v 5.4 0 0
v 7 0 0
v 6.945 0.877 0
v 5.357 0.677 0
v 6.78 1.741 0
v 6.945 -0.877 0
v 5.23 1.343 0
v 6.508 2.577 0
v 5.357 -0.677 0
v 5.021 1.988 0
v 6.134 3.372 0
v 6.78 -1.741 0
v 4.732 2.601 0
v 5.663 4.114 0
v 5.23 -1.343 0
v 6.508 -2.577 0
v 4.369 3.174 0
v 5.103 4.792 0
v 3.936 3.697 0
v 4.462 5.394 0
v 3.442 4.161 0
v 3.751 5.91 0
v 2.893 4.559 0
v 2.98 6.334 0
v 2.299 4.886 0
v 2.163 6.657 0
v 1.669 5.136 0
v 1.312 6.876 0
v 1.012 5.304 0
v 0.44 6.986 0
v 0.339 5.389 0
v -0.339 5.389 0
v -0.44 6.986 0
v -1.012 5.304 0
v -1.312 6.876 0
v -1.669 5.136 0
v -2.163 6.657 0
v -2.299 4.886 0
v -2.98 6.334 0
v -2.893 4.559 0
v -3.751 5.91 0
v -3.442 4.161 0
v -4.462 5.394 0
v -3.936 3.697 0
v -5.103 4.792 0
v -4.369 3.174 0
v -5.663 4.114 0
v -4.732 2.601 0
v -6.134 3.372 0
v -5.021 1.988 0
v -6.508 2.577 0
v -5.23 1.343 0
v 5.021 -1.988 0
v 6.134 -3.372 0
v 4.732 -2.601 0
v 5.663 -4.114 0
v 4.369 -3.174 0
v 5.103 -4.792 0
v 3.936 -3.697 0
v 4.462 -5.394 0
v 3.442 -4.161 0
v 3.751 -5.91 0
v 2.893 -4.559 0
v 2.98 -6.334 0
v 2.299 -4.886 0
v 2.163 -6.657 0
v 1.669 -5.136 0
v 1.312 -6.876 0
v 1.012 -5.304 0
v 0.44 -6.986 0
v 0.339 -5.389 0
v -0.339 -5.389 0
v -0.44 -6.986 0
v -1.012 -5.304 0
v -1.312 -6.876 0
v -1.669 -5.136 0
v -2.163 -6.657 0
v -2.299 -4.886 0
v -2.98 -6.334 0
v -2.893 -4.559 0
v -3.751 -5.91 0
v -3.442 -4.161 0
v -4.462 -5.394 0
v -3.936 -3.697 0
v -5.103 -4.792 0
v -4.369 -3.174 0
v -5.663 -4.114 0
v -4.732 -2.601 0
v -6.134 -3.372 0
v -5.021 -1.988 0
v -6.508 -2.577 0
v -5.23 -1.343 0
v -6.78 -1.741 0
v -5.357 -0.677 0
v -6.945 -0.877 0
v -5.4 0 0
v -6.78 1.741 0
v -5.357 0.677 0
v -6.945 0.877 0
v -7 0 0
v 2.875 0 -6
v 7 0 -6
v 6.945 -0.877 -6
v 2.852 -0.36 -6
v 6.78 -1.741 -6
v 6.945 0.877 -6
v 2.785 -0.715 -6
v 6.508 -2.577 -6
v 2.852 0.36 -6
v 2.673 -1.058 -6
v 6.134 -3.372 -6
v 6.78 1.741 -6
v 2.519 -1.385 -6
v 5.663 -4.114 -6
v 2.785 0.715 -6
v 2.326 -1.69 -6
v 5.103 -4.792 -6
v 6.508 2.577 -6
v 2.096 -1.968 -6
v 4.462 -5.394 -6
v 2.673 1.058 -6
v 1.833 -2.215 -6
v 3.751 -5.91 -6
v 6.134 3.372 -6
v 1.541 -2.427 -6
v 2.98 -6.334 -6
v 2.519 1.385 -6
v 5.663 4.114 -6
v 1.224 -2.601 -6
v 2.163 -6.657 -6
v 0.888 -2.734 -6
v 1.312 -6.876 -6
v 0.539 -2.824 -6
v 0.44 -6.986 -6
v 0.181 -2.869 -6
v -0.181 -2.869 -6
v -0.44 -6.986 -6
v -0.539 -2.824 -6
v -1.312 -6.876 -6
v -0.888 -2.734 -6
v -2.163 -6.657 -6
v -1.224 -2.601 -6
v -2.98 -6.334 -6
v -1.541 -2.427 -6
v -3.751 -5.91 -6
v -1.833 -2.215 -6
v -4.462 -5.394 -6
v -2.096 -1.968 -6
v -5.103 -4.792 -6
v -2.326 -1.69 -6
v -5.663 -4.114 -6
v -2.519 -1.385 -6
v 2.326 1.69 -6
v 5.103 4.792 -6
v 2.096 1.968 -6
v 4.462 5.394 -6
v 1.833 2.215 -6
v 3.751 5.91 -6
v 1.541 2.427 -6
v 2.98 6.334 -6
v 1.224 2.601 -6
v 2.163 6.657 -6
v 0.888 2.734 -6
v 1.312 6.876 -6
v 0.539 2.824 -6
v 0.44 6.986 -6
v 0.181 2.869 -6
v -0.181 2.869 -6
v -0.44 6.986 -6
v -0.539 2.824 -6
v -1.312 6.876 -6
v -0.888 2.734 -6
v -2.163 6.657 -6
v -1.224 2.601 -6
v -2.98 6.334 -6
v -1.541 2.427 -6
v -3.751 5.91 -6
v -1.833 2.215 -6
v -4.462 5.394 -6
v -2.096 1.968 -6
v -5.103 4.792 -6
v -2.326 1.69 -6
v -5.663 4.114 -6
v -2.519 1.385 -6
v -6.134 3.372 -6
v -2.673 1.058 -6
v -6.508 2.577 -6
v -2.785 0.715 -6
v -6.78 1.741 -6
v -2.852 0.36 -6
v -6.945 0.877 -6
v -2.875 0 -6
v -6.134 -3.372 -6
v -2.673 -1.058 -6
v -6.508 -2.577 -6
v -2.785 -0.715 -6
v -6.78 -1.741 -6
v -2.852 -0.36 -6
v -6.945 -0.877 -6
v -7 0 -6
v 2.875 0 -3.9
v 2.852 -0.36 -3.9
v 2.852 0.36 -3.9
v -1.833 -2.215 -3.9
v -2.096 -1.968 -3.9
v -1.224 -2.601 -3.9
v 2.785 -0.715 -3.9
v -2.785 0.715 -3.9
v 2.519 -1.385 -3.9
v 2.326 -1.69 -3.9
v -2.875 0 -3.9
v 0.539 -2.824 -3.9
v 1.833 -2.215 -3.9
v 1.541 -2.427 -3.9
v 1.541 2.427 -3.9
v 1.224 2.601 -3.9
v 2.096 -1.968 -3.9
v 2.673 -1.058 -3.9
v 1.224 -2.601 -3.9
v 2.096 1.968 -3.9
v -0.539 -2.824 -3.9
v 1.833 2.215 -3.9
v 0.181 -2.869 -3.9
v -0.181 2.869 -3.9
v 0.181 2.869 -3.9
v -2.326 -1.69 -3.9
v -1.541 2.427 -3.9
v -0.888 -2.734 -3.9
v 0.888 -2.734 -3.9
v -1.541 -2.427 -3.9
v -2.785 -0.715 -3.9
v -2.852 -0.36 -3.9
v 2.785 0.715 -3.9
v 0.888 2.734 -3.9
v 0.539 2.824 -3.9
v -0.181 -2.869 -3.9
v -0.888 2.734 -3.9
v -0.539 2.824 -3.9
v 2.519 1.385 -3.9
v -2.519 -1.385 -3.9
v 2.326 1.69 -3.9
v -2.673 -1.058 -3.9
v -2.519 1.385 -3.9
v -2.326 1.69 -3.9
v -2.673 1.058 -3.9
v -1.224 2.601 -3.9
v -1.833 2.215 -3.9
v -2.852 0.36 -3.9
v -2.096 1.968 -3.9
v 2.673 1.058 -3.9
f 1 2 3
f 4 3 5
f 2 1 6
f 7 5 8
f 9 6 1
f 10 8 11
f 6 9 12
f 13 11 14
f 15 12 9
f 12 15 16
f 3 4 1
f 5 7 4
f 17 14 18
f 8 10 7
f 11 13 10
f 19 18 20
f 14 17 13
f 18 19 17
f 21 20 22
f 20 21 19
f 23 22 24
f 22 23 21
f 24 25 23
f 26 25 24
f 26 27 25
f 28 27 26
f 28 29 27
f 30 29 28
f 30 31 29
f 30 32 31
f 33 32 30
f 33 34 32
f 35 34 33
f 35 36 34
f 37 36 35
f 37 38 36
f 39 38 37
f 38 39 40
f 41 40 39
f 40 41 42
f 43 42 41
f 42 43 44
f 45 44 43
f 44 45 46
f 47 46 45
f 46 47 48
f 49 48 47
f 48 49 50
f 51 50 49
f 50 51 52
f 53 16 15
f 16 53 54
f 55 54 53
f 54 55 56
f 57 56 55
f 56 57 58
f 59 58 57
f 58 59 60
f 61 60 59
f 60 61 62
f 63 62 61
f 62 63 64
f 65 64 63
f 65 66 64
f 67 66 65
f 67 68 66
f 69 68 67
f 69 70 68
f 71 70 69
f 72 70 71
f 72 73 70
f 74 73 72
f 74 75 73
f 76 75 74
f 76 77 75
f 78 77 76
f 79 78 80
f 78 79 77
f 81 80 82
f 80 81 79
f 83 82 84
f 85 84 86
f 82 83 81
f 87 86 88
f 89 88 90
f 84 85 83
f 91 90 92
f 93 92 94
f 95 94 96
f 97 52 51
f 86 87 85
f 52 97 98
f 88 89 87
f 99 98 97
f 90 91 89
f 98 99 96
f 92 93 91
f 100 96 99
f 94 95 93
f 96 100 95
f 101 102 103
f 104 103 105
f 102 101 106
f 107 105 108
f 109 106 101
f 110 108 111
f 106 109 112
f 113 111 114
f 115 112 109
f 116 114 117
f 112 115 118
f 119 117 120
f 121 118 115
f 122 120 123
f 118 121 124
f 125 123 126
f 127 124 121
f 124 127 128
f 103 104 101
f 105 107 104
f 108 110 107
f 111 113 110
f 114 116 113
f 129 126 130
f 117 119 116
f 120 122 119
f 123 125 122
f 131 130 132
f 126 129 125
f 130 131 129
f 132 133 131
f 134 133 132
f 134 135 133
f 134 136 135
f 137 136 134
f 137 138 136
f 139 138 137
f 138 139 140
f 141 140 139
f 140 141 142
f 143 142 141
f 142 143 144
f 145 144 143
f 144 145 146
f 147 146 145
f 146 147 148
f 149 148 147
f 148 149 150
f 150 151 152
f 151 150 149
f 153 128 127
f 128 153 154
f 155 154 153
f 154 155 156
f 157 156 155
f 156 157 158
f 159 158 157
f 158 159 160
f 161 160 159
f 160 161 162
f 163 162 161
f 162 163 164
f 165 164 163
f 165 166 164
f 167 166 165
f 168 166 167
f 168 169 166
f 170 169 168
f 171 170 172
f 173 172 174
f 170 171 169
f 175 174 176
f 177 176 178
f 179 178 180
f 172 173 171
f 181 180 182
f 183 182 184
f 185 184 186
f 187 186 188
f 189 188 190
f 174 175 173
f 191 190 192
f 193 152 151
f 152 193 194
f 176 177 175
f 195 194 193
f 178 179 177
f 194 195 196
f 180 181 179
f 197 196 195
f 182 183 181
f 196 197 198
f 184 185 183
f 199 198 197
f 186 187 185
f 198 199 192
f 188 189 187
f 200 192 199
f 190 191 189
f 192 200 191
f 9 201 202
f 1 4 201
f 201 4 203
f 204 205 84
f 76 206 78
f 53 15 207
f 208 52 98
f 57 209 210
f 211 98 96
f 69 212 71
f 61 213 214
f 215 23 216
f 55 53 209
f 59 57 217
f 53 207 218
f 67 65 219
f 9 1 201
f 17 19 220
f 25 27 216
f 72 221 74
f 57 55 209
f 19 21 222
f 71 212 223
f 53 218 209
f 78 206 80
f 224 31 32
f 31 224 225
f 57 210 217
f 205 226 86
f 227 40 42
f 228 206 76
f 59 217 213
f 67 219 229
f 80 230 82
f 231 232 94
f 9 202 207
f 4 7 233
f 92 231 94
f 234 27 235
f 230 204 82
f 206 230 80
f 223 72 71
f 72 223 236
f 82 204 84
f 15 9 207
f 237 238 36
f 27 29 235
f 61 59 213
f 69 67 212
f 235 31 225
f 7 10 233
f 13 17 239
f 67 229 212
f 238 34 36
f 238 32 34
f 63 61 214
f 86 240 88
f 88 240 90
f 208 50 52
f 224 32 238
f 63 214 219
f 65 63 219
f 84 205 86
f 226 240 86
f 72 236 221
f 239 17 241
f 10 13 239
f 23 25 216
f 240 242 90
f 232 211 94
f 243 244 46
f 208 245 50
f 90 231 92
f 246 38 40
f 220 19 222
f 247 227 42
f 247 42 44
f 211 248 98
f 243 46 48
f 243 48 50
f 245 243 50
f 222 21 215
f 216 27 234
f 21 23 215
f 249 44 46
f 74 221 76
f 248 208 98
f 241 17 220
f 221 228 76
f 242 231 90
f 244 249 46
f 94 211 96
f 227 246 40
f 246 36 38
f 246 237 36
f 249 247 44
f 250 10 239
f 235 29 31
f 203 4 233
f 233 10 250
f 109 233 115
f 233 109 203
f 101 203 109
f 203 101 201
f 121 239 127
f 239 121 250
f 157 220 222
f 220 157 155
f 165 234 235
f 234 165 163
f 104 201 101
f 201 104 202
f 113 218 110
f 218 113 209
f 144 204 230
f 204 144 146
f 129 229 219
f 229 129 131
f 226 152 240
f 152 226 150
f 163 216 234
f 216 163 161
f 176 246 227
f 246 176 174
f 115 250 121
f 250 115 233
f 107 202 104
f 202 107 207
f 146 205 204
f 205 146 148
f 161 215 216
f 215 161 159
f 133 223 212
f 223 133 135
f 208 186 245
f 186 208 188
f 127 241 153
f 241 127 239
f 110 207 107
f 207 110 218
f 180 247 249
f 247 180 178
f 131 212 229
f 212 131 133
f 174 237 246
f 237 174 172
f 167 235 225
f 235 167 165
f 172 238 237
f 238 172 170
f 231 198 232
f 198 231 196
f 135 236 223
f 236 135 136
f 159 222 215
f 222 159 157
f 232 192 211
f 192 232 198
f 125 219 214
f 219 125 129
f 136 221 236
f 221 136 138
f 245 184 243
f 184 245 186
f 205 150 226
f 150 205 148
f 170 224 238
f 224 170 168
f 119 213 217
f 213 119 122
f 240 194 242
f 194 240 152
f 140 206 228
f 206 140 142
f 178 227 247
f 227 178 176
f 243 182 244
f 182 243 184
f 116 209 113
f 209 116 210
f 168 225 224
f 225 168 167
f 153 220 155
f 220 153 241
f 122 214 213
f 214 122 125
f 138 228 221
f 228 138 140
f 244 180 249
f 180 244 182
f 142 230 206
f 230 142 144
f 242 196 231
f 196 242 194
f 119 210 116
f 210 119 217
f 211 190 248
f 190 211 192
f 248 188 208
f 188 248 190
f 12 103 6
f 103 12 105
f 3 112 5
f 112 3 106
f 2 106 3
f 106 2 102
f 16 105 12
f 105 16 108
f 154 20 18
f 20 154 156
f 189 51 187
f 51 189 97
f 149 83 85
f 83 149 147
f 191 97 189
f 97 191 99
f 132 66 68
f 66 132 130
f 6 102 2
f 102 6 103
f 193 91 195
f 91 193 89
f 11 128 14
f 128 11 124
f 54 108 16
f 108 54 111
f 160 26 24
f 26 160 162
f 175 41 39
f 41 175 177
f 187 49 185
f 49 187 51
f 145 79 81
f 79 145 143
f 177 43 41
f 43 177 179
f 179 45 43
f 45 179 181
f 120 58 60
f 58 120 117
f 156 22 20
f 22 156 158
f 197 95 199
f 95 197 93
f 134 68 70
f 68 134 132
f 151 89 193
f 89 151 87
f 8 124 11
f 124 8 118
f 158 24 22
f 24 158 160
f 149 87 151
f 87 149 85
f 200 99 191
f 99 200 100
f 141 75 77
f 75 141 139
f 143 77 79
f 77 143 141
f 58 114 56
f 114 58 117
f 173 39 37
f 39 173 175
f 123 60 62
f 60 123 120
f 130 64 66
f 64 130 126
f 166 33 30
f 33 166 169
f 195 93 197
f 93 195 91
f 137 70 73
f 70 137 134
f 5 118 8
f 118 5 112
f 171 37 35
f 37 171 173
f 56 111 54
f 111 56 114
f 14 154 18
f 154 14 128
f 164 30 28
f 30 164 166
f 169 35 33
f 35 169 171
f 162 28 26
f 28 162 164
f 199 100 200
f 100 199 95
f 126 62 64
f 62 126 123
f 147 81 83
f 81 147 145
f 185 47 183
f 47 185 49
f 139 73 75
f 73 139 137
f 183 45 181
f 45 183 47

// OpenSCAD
$fn = 50;


difference() {
	union() {
		translate(v = [0, 0, -6.0000000000]) {
			cylinder(h = 6, r = 7.0000000000);
		}
	}
	union() {
		translate(v = [0, 0, 0]) {
			rotate(a = [0, 0, 0]) {
				difference() {
					union() {
						#translate(v = [0, 0, -6.0000000000]) {
							cylinder(h = 6, r = 2.6000000000);
						}
						#translate(v = [0, 0, -3.9000000000]) {
							cylinder(h = 3.9000000000, r = 7.0000000000, r1 = 2.8750000000, r2 = 5.4000000000);
						}
						#translate(v = [0, 0, -6.0000000000]) {
							cylinder(h = 6, r = 2.8750000000);
						}
						#translate(v = [0, 0, -6.0000000000]) {
							cylinder(h = 6, r = 2.6000000000);
						}
					}
					union();
				}
			}
		}
	}
}
